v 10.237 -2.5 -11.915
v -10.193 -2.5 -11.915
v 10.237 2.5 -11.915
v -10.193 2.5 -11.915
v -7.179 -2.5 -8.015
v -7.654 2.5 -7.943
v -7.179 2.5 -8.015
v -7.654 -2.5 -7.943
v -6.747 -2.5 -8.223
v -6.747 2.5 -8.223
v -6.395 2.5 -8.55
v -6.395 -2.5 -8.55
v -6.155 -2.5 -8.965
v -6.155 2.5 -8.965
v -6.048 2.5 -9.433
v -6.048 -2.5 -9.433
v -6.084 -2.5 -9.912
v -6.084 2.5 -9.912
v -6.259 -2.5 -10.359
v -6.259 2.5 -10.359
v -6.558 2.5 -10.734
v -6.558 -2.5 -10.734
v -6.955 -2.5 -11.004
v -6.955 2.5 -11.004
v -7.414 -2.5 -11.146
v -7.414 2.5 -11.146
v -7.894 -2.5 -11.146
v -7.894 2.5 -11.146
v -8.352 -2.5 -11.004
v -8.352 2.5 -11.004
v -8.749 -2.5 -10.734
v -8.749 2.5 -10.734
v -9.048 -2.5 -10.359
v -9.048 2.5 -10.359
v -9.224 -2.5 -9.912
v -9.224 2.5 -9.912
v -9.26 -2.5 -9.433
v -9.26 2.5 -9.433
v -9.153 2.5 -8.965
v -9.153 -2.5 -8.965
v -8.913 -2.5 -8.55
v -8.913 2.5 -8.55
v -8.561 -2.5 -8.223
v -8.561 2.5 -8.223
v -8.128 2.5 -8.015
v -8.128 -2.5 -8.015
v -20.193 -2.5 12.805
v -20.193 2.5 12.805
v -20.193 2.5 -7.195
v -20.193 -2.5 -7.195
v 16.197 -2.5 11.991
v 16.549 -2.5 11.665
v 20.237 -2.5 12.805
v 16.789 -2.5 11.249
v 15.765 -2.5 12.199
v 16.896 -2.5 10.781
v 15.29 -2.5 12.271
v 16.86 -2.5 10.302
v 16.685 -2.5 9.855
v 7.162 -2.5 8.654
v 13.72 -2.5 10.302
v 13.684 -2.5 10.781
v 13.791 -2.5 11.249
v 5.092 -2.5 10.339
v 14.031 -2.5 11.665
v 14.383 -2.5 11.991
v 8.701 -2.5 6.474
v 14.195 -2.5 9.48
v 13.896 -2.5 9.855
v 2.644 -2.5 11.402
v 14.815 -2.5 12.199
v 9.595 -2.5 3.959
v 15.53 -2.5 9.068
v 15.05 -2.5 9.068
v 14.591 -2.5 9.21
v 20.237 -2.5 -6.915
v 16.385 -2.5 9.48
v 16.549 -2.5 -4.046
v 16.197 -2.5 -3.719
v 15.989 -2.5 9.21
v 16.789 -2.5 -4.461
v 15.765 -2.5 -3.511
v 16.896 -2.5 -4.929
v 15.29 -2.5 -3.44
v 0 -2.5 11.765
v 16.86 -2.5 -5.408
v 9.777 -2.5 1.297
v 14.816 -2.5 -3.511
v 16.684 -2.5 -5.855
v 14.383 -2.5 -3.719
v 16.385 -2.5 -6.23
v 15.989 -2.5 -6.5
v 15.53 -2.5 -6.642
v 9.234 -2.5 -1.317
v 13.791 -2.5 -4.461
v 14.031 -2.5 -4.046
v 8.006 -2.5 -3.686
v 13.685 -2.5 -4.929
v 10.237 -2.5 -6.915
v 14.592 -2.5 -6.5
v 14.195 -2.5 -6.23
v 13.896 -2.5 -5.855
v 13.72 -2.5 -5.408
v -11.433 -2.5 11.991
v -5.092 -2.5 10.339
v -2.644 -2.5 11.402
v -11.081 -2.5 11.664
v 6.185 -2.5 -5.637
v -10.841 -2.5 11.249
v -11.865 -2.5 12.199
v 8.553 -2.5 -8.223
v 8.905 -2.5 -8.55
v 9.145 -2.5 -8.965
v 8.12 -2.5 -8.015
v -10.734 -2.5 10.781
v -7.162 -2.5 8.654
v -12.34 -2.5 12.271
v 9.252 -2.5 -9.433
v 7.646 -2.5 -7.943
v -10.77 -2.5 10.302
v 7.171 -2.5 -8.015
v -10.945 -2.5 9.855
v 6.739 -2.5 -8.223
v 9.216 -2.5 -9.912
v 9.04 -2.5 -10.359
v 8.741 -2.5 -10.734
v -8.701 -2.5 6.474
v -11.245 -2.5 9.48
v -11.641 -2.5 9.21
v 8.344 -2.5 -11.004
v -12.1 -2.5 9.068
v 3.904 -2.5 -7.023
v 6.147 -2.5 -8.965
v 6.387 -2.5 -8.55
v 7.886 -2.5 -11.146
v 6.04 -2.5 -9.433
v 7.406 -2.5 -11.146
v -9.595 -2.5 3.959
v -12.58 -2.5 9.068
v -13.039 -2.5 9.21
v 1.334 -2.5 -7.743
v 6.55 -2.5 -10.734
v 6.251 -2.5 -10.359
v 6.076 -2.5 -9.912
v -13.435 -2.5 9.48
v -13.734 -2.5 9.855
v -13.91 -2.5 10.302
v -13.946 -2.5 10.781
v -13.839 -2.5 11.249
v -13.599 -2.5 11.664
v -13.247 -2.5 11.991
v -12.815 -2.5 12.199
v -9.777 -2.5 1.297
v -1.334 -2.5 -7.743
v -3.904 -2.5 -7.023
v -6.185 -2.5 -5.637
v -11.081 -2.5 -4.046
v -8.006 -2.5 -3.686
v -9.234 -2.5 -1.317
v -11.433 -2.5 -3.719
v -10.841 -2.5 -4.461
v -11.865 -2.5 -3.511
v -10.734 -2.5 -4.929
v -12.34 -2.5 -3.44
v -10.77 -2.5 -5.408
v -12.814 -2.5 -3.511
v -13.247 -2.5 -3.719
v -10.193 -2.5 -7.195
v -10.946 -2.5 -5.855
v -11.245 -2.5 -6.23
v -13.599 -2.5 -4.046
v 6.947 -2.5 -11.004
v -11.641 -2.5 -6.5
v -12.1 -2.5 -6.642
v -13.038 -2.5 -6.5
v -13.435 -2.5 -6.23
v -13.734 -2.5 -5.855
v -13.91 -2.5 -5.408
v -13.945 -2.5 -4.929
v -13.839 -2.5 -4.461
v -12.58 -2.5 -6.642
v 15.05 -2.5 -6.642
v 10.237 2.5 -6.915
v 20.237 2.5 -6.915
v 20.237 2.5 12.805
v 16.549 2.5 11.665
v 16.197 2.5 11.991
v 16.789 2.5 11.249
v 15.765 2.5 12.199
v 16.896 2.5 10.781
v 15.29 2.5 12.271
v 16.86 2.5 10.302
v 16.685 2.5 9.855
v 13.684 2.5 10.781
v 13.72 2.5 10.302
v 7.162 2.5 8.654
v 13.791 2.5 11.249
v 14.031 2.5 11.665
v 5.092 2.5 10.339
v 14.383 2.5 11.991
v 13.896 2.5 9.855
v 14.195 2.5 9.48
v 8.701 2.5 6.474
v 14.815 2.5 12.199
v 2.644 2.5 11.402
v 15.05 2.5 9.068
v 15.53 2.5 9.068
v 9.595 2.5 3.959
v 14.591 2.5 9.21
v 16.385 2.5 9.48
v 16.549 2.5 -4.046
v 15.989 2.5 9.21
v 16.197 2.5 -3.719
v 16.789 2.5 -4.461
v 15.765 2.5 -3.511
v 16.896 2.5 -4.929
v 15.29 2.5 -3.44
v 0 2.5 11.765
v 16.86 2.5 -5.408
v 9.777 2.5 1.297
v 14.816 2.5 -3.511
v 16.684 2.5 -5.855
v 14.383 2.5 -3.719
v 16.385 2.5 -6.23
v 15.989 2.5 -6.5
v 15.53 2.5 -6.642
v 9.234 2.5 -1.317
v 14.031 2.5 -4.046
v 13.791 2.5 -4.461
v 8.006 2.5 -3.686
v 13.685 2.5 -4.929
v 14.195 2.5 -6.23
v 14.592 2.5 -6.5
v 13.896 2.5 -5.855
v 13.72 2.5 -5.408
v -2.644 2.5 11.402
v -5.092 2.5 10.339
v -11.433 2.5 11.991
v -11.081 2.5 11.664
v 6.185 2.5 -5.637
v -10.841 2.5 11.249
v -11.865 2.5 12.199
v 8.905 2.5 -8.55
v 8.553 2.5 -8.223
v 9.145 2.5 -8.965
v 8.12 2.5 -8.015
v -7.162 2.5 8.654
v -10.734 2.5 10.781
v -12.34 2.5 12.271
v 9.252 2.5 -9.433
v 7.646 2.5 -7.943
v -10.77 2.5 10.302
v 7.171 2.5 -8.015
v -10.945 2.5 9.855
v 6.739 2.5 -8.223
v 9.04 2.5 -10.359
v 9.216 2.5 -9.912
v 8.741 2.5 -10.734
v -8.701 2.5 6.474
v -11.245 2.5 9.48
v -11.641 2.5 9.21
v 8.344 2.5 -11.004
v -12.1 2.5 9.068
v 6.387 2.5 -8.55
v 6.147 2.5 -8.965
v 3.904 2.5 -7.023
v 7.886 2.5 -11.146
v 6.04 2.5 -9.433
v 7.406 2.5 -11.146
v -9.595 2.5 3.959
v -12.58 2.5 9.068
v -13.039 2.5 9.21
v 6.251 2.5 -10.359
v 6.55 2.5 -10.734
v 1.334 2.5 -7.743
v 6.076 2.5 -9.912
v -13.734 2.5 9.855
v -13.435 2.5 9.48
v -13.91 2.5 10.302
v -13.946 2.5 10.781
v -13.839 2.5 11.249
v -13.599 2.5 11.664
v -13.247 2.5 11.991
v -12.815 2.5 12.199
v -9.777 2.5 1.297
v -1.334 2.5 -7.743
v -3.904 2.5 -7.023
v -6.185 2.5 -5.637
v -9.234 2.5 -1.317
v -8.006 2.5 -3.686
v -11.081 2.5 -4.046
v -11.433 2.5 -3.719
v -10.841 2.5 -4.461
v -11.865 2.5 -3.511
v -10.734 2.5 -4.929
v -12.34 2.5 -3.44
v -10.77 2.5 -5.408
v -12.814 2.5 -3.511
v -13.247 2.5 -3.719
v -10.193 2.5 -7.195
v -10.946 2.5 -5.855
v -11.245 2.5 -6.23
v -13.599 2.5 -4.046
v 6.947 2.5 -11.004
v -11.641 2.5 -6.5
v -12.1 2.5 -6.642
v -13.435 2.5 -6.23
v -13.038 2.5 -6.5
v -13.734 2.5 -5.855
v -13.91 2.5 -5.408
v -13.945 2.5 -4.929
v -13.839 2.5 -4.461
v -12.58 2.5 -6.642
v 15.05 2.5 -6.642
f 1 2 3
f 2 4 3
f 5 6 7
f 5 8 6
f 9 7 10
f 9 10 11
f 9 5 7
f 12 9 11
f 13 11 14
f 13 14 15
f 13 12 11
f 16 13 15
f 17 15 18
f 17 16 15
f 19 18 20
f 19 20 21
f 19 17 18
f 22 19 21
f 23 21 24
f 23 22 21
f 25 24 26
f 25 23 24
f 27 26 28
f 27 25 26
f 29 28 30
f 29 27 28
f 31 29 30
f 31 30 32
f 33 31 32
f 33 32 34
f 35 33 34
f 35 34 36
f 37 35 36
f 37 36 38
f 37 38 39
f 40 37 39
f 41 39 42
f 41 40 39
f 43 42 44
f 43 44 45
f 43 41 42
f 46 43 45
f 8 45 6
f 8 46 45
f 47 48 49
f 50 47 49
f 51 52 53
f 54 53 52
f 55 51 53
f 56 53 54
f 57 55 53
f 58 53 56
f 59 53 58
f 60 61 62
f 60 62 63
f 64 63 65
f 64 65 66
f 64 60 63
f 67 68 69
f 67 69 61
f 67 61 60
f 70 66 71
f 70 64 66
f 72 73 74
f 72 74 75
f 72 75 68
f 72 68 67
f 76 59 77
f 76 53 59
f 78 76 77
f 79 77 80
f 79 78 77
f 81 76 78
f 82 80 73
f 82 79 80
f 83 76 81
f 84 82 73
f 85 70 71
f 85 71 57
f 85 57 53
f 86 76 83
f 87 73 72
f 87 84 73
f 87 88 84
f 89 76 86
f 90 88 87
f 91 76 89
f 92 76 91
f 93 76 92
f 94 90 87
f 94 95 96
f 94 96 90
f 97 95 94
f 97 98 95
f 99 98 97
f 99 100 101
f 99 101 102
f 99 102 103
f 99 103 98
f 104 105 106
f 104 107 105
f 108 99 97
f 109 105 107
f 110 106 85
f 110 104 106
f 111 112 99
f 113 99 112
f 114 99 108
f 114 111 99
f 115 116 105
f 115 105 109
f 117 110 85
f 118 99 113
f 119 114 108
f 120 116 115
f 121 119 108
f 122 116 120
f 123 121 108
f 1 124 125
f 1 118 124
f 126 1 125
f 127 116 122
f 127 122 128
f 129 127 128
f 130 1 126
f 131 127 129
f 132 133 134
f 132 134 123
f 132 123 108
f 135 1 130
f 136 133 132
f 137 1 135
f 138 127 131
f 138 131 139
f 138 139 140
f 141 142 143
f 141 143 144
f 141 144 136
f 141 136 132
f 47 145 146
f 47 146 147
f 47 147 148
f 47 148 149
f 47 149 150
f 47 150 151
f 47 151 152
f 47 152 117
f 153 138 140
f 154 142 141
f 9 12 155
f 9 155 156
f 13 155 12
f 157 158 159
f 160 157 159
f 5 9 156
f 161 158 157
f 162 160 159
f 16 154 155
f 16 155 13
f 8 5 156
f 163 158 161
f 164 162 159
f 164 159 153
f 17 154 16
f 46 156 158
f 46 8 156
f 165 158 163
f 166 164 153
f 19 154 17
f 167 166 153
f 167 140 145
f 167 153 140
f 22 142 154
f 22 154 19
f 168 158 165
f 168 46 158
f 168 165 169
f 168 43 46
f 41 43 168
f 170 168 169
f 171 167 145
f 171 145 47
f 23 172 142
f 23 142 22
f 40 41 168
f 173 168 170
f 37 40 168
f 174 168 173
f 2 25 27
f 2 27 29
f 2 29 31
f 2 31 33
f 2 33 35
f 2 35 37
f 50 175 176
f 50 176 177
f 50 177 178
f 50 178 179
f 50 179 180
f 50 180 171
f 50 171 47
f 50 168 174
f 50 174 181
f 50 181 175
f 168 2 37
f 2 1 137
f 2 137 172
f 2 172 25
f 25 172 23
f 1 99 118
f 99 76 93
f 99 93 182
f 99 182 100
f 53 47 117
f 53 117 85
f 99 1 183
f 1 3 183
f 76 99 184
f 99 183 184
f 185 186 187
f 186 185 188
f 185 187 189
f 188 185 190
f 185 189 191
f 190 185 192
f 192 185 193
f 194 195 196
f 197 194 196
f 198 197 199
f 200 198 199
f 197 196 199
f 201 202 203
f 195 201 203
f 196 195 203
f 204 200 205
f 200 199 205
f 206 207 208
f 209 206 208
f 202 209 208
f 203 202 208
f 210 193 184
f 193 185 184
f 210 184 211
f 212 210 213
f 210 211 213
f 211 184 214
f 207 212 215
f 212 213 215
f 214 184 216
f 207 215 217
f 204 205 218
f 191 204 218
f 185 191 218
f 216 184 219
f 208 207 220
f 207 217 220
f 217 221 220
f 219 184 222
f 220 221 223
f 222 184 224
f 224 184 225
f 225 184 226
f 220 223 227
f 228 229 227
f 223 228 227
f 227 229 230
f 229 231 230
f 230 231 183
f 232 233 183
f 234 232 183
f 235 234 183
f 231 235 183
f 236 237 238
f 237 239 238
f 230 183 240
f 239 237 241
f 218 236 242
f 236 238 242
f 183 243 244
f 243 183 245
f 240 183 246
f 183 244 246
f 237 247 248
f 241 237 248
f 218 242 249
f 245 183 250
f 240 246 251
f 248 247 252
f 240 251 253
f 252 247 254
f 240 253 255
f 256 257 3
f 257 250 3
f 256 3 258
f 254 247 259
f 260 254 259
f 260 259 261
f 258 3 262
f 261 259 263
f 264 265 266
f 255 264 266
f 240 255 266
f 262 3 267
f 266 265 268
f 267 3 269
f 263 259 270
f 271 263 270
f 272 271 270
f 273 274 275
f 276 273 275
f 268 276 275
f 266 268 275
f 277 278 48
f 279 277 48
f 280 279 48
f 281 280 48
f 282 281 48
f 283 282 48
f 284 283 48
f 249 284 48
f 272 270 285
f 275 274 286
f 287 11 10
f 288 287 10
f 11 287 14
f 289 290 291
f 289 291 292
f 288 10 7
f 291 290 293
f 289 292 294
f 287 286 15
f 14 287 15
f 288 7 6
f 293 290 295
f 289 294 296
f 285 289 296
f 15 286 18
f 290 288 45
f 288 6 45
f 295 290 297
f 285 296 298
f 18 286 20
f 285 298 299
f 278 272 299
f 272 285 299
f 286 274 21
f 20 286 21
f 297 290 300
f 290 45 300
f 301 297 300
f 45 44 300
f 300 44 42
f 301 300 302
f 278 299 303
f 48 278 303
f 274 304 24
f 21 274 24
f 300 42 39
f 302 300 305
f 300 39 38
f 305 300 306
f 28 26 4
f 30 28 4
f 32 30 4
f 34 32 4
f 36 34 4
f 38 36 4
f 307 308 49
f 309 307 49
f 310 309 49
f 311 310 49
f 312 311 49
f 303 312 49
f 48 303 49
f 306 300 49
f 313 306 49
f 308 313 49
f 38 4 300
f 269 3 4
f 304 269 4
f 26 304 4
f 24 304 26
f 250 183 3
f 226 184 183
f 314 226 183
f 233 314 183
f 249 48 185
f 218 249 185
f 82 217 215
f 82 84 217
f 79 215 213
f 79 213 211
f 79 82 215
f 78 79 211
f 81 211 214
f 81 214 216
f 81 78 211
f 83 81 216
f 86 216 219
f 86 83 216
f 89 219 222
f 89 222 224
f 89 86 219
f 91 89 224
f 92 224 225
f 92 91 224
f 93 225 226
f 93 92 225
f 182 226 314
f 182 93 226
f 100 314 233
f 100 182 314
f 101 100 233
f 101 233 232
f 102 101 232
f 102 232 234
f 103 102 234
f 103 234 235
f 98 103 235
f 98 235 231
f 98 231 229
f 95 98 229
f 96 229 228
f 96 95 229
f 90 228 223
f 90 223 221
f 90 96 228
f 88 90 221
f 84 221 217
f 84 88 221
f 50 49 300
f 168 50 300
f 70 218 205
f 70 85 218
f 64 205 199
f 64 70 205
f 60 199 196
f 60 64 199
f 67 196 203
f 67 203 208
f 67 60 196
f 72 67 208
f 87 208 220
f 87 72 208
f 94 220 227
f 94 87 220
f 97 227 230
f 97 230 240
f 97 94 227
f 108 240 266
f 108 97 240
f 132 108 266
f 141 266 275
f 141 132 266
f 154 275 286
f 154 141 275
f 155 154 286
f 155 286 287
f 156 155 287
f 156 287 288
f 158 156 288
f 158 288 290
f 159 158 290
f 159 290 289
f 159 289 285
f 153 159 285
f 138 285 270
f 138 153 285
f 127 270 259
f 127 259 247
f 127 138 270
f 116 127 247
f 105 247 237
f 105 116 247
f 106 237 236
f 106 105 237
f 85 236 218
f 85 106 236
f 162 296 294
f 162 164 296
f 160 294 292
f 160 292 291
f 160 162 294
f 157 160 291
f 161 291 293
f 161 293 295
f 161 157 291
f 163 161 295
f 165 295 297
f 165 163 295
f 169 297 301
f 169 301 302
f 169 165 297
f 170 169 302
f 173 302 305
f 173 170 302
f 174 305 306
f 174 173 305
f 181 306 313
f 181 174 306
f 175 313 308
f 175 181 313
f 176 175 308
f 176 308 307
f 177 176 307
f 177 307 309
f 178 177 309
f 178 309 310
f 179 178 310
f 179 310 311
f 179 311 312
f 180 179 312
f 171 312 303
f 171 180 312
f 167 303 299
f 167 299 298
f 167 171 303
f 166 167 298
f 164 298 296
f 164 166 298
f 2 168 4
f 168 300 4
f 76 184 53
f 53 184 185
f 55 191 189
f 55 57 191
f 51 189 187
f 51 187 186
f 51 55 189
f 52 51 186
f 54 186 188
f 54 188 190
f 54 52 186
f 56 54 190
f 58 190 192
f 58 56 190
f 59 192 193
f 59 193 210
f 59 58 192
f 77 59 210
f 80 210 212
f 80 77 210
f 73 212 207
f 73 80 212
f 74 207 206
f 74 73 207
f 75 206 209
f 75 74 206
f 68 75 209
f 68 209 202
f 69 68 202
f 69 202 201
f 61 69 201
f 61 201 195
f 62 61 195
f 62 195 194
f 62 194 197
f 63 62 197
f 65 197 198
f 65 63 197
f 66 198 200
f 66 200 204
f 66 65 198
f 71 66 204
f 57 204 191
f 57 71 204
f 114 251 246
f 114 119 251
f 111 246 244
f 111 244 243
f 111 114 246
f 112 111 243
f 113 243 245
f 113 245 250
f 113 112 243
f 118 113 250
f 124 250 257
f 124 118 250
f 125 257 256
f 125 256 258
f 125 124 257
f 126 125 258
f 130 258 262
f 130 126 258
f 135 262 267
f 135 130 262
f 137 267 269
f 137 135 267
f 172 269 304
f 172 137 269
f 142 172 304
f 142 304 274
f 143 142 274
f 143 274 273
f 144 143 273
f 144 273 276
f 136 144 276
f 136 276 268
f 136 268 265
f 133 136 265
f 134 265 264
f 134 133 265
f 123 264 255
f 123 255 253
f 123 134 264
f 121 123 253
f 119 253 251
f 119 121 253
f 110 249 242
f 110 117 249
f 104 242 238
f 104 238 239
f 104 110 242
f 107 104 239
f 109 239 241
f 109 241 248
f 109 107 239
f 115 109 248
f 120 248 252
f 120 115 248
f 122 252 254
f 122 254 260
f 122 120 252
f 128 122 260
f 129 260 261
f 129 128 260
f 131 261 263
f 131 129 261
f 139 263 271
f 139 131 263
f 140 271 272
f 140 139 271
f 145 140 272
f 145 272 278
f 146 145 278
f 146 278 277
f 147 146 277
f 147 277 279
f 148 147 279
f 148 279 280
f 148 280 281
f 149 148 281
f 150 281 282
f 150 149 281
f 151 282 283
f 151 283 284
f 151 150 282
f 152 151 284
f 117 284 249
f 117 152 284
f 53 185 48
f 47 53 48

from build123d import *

# Parameters (mm, degrees)
CROQUIS1_R              = 9.8
CROQUIS1_R_2            = 1.61
CROQUIS1_R_3            = 1.610199264
CROQUIS1_R_4            = 1.610298895
SALIENTE_EXTRUIR2_DEPTH = 2.5


with BuildPart() as part:
    # Croquis1 → Saliente-Extruir2 (new, symmetric)
    with BuildSketch(Plane(origin=(0, 0, 0), x_dir=(1, 0, 0), z_dir=(0, 1, 0))):
        Polygon((-20.192989013, 7.194690523), (-10.192989013, 7.194690523), (-10.192989013, 11.914690523), (10.237010987, 11.914690523), (10.237010987, 6.914690523), (20.237010987, 6.914690523), (20.237010987, -12.805309477), (-20.192989013, -12.805309477), align=None)
        with Locations(Location((0, -1.965309477, 0), (0, 0, 270))):
            Circle(CROQUIS1_R, mode=Mode.SUBTRACT)
        with Locations(Location((-12.339891833, 5.049690523, 0), (0, 0, 270))):
            Circle(CROQUIS1_R_2, mode=Mode.SUBTRACT)
        with Locations(Location((-12.339891833, -10.660508741, 0), (0, 0, 270))):
            Circle(CROQUIS1_R_3, mode=Mode.SUBTRACT)
        with Locations(Location((15.290108167, 5.049690523, 0), (0, 0, 270))):
            Circle(CROQUIS1_R_2, mode=Mode.SUBTRACT)
        with Locations(Location((15.290108167, -10.660608373, 0), (0, 0, 270))):
            Circle(CROQUIS1_R_4, mode=Mode.SUBTRACT)
        with Locations(Location((-7.653762012, 9.553535498, 0), (0, 0, 270))):
            Circle(CROQUIS1_R_4, mode=Mode.SUBTRACT)
        with Locations(Location((7.645768396, 9.553535498, 0), (0, 0, 270))):
            Circle(CROQUIS1_R_4, mode=Mode.SUBTRACT)
    extrude(amount=SALIENTE_EXTRUIR2_DEPTH, both=True)


solid = part.part
